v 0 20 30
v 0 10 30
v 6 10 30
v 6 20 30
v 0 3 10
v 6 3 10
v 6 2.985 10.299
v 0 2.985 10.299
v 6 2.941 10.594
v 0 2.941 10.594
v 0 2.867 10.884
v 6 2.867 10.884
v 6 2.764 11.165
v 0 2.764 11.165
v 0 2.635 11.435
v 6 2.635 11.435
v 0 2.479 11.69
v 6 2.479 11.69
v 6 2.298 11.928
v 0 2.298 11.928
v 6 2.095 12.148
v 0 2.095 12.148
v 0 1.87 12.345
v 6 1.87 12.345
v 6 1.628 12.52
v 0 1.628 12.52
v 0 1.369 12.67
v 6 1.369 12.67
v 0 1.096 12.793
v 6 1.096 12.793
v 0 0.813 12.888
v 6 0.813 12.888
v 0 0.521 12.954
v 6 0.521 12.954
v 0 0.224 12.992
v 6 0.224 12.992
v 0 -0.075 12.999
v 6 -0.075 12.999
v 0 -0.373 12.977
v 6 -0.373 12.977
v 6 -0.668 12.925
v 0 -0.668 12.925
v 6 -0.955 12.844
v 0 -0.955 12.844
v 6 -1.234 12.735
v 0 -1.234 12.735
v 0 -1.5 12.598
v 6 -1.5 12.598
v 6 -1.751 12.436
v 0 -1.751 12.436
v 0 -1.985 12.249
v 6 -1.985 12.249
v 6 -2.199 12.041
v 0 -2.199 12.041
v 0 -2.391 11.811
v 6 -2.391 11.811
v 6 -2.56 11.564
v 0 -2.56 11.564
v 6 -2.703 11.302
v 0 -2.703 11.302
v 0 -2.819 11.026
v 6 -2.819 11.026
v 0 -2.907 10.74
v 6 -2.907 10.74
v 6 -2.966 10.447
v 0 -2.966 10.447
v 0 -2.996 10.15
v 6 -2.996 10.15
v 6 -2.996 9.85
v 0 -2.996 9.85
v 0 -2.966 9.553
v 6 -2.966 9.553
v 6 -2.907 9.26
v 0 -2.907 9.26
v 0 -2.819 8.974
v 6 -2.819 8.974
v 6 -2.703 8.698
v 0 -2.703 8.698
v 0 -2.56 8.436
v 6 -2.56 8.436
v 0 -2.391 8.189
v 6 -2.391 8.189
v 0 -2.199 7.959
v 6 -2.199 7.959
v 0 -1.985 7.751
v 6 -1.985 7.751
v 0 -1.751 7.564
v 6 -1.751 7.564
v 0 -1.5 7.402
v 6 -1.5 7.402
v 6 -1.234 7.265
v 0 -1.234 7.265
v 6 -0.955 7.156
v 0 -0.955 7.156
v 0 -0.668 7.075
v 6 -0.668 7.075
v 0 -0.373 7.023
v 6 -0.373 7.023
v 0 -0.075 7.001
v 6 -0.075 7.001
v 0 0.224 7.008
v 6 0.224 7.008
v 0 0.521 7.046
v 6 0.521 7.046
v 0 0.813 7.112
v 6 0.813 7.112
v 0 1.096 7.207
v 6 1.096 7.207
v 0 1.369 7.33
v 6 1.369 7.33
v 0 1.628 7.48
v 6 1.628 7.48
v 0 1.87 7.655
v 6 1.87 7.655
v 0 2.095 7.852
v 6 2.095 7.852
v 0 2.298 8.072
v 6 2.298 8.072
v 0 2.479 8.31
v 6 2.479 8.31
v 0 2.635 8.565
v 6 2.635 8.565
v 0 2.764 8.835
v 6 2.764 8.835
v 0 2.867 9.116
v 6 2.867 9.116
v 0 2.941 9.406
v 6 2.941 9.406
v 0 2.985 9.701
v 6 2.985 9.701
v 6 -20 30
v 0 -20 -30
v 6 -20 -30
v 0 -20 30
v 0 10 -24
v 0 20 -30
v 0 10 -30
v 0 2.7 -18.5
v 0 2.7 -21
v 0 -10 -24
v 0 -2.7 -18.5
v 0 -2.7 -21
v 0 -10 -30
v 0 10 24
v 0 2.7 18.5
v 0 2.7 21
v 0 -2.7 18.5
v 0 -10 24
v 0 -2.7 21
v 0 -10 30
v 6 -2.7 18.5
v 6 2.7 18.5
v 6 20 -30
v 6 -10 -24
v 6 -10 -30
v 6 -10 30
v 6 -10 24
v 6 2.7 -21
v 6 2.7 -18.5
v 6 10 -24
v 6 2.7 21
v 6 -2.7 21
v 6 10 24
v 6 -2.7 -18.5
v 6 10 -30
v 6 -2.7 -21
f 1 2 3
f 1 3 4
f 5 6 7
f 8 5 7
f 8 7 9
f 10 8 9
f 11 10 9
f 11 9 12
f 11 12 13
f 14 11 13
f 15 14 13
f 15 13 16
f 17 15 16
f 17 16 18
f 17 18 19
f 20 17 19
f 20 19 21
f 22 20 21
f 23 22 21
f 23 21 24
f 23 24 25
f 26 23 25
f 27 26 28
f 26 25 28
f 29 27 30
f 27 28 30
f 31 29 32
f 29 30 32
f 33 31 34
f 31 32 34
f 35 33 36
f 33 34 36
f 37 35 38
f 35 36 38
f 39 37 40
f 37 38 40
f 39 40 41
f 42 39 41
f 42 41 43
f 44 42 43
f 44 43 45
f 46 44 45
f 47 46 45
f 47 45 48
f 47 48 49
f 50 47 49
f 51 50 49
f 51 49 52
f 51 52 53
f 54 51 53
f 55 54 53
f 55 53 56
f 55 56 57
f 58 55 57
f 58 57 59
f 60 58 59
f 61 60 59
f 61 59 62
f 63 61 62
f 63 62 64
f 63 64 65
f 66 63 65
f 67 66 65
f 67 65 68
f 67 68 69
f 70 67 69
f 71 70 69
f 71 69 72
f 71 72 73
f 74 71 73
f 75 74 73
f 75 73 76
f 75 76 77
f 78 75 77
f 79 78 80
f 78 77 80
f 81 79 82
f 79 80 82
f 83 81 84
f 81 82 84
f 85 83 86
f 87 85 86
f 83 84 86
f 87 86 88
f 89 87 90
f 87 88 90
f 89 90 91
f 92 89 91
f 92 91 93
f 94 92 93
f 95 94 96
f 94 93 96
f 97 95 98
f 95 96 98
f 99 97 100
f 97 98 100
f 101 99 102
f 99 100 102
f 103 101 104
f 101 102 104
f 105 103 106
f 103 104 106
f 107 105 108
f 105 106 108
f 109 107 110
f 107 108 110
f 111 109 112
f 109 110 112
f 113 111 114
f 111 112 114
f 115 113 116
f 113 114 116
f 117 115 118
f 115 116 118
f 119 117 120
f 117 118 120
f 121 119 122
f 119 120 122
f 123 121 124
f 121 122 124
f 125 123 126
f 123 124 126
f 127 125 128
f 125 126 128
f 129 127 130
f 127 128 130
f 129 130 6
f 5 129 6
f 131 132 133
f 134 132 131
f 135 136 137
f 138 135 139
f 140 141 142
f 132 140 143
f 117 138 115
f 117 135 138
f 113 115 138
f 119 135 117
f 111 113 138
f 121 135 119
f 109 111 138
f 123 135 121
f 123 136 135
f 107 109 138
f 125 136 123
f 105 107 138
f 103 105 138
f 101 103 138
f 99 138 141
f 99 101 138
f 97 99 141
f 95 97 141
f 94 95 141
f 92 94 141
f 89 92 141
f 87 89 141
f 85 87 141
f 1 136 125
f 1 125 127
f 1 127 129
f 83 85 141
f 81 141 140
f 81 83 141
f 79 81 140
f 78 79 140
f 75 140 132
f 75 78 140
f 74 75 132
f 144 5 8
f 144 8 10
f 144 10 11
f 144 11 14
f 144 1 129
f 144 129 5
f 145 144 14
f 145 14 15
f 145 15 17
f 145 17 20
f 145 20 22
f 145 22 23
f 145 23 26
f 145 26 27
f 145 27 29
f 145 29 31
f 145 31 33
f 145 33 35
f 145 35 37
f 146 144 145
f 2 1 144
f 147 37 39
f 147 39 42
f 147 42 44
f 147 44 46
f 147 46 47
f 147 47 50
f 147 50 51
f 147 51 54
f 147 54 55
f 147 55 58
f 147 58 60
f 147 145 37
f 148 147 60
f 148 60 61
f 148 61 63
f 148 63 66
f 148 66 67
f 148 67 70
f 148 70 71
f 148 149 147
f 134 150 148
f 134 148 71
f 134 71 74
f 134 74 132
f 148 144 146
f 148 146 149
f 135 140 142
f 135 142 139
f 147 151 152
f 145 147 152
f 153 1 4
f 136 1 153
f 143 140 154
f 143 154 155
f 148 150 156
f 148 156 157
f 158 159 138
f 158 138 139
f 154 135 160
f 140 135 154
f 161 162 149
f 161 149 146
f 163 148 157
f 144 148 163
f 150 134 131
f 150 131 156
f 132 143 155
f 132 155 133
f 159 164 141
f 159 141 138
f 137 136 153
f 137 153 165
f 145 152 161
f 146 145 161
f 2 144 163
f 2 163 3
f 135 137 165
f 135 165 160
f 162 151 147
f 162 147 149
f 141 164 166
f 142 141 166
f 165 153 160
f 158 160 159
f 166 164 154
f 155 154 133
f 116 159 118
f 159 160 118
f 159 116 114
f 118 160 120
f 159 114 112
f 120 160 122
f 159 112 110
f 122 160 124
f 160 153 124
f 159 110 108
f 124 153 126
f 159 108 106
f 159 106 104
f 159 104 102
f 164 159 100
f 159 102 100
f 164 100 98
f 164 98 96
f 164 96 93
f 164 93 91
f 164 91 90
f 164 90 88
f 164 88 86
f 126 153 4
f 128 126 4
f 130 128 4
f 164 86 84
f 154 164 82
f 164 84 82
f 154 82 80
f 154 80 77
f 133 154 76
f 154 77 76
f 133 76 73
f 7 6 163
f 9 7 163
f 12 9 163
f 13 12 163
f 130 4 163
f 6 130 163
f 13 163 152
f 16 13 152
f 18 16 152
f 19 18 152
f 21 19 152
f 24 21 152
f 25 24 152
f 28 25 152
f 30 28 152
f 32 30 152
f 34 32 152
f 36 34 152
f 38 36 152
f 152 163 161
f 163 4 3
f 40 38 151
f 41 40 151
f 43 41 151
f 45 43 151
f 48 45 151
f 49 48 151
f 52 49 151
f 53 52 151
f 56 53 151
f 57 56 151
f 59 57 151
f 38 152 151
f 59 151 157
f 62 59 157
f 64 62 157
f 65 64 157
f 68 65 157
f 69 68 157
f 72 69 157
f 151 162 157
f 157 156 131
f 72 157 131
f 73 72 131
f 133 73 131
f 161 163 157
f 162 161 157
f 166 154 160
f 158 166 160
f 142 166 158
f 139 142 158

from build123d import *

# Parameters (mm, degrees)
PAD_DEPTH       = 6
SKETCH001_R     = 3
POCKET_DEPTH    = 6.001
SKETCH002_W     = 5.4
SKETCH002_H     = 2.5
POCKET001_DEPTH = 150.72142


with BuildPart() as part:
    # Sketch → Pad (new body)
    with BuildSketch(Plane.YZ):
        Polygon((-20, -30), (-20, 30), (-10, 30), (-10, 24), (10, 24), (10, 30), (20, 30), (20, -30), (10, -30), (10, -24), (-10, -24), (-10, -30), align=None)
    extrude(amount=PAD_DEPTH)

    # Sketch001 (on Face14 of Pad) → Pocket (cut, through all)
    with BuildSketch(Plane.YZ.offset(6)):
        with Locations((0, 10)):
            Circle(SKETCH001_R)
    extrude(amount=-POCKET_DEPTH, mode=Mode.SUBTRACT)

    # Sketch002 (on Face5 of Pocket) → Pocket001 (cut, through all)
    with BuildSketch(Plane.YZ.offset(6)):
        with Locations((0, 19.75)):
            Rectangle(SKETCH002_W, SKETCH002_H)
    pocket001 = extrude(amount=-POCKET001_DEPTH, mode=Mode.SUBTRACT)

    # Mirrored: Pocket001 across Sketch002 H_Axis
    add(pocket001.mirror(Plane(origin=(6, 0, 0), x_dir=(1, 0, 0), z_dir=(0, 0, 1))), mode=Mode.SUBTRACT)


solid = part.part
